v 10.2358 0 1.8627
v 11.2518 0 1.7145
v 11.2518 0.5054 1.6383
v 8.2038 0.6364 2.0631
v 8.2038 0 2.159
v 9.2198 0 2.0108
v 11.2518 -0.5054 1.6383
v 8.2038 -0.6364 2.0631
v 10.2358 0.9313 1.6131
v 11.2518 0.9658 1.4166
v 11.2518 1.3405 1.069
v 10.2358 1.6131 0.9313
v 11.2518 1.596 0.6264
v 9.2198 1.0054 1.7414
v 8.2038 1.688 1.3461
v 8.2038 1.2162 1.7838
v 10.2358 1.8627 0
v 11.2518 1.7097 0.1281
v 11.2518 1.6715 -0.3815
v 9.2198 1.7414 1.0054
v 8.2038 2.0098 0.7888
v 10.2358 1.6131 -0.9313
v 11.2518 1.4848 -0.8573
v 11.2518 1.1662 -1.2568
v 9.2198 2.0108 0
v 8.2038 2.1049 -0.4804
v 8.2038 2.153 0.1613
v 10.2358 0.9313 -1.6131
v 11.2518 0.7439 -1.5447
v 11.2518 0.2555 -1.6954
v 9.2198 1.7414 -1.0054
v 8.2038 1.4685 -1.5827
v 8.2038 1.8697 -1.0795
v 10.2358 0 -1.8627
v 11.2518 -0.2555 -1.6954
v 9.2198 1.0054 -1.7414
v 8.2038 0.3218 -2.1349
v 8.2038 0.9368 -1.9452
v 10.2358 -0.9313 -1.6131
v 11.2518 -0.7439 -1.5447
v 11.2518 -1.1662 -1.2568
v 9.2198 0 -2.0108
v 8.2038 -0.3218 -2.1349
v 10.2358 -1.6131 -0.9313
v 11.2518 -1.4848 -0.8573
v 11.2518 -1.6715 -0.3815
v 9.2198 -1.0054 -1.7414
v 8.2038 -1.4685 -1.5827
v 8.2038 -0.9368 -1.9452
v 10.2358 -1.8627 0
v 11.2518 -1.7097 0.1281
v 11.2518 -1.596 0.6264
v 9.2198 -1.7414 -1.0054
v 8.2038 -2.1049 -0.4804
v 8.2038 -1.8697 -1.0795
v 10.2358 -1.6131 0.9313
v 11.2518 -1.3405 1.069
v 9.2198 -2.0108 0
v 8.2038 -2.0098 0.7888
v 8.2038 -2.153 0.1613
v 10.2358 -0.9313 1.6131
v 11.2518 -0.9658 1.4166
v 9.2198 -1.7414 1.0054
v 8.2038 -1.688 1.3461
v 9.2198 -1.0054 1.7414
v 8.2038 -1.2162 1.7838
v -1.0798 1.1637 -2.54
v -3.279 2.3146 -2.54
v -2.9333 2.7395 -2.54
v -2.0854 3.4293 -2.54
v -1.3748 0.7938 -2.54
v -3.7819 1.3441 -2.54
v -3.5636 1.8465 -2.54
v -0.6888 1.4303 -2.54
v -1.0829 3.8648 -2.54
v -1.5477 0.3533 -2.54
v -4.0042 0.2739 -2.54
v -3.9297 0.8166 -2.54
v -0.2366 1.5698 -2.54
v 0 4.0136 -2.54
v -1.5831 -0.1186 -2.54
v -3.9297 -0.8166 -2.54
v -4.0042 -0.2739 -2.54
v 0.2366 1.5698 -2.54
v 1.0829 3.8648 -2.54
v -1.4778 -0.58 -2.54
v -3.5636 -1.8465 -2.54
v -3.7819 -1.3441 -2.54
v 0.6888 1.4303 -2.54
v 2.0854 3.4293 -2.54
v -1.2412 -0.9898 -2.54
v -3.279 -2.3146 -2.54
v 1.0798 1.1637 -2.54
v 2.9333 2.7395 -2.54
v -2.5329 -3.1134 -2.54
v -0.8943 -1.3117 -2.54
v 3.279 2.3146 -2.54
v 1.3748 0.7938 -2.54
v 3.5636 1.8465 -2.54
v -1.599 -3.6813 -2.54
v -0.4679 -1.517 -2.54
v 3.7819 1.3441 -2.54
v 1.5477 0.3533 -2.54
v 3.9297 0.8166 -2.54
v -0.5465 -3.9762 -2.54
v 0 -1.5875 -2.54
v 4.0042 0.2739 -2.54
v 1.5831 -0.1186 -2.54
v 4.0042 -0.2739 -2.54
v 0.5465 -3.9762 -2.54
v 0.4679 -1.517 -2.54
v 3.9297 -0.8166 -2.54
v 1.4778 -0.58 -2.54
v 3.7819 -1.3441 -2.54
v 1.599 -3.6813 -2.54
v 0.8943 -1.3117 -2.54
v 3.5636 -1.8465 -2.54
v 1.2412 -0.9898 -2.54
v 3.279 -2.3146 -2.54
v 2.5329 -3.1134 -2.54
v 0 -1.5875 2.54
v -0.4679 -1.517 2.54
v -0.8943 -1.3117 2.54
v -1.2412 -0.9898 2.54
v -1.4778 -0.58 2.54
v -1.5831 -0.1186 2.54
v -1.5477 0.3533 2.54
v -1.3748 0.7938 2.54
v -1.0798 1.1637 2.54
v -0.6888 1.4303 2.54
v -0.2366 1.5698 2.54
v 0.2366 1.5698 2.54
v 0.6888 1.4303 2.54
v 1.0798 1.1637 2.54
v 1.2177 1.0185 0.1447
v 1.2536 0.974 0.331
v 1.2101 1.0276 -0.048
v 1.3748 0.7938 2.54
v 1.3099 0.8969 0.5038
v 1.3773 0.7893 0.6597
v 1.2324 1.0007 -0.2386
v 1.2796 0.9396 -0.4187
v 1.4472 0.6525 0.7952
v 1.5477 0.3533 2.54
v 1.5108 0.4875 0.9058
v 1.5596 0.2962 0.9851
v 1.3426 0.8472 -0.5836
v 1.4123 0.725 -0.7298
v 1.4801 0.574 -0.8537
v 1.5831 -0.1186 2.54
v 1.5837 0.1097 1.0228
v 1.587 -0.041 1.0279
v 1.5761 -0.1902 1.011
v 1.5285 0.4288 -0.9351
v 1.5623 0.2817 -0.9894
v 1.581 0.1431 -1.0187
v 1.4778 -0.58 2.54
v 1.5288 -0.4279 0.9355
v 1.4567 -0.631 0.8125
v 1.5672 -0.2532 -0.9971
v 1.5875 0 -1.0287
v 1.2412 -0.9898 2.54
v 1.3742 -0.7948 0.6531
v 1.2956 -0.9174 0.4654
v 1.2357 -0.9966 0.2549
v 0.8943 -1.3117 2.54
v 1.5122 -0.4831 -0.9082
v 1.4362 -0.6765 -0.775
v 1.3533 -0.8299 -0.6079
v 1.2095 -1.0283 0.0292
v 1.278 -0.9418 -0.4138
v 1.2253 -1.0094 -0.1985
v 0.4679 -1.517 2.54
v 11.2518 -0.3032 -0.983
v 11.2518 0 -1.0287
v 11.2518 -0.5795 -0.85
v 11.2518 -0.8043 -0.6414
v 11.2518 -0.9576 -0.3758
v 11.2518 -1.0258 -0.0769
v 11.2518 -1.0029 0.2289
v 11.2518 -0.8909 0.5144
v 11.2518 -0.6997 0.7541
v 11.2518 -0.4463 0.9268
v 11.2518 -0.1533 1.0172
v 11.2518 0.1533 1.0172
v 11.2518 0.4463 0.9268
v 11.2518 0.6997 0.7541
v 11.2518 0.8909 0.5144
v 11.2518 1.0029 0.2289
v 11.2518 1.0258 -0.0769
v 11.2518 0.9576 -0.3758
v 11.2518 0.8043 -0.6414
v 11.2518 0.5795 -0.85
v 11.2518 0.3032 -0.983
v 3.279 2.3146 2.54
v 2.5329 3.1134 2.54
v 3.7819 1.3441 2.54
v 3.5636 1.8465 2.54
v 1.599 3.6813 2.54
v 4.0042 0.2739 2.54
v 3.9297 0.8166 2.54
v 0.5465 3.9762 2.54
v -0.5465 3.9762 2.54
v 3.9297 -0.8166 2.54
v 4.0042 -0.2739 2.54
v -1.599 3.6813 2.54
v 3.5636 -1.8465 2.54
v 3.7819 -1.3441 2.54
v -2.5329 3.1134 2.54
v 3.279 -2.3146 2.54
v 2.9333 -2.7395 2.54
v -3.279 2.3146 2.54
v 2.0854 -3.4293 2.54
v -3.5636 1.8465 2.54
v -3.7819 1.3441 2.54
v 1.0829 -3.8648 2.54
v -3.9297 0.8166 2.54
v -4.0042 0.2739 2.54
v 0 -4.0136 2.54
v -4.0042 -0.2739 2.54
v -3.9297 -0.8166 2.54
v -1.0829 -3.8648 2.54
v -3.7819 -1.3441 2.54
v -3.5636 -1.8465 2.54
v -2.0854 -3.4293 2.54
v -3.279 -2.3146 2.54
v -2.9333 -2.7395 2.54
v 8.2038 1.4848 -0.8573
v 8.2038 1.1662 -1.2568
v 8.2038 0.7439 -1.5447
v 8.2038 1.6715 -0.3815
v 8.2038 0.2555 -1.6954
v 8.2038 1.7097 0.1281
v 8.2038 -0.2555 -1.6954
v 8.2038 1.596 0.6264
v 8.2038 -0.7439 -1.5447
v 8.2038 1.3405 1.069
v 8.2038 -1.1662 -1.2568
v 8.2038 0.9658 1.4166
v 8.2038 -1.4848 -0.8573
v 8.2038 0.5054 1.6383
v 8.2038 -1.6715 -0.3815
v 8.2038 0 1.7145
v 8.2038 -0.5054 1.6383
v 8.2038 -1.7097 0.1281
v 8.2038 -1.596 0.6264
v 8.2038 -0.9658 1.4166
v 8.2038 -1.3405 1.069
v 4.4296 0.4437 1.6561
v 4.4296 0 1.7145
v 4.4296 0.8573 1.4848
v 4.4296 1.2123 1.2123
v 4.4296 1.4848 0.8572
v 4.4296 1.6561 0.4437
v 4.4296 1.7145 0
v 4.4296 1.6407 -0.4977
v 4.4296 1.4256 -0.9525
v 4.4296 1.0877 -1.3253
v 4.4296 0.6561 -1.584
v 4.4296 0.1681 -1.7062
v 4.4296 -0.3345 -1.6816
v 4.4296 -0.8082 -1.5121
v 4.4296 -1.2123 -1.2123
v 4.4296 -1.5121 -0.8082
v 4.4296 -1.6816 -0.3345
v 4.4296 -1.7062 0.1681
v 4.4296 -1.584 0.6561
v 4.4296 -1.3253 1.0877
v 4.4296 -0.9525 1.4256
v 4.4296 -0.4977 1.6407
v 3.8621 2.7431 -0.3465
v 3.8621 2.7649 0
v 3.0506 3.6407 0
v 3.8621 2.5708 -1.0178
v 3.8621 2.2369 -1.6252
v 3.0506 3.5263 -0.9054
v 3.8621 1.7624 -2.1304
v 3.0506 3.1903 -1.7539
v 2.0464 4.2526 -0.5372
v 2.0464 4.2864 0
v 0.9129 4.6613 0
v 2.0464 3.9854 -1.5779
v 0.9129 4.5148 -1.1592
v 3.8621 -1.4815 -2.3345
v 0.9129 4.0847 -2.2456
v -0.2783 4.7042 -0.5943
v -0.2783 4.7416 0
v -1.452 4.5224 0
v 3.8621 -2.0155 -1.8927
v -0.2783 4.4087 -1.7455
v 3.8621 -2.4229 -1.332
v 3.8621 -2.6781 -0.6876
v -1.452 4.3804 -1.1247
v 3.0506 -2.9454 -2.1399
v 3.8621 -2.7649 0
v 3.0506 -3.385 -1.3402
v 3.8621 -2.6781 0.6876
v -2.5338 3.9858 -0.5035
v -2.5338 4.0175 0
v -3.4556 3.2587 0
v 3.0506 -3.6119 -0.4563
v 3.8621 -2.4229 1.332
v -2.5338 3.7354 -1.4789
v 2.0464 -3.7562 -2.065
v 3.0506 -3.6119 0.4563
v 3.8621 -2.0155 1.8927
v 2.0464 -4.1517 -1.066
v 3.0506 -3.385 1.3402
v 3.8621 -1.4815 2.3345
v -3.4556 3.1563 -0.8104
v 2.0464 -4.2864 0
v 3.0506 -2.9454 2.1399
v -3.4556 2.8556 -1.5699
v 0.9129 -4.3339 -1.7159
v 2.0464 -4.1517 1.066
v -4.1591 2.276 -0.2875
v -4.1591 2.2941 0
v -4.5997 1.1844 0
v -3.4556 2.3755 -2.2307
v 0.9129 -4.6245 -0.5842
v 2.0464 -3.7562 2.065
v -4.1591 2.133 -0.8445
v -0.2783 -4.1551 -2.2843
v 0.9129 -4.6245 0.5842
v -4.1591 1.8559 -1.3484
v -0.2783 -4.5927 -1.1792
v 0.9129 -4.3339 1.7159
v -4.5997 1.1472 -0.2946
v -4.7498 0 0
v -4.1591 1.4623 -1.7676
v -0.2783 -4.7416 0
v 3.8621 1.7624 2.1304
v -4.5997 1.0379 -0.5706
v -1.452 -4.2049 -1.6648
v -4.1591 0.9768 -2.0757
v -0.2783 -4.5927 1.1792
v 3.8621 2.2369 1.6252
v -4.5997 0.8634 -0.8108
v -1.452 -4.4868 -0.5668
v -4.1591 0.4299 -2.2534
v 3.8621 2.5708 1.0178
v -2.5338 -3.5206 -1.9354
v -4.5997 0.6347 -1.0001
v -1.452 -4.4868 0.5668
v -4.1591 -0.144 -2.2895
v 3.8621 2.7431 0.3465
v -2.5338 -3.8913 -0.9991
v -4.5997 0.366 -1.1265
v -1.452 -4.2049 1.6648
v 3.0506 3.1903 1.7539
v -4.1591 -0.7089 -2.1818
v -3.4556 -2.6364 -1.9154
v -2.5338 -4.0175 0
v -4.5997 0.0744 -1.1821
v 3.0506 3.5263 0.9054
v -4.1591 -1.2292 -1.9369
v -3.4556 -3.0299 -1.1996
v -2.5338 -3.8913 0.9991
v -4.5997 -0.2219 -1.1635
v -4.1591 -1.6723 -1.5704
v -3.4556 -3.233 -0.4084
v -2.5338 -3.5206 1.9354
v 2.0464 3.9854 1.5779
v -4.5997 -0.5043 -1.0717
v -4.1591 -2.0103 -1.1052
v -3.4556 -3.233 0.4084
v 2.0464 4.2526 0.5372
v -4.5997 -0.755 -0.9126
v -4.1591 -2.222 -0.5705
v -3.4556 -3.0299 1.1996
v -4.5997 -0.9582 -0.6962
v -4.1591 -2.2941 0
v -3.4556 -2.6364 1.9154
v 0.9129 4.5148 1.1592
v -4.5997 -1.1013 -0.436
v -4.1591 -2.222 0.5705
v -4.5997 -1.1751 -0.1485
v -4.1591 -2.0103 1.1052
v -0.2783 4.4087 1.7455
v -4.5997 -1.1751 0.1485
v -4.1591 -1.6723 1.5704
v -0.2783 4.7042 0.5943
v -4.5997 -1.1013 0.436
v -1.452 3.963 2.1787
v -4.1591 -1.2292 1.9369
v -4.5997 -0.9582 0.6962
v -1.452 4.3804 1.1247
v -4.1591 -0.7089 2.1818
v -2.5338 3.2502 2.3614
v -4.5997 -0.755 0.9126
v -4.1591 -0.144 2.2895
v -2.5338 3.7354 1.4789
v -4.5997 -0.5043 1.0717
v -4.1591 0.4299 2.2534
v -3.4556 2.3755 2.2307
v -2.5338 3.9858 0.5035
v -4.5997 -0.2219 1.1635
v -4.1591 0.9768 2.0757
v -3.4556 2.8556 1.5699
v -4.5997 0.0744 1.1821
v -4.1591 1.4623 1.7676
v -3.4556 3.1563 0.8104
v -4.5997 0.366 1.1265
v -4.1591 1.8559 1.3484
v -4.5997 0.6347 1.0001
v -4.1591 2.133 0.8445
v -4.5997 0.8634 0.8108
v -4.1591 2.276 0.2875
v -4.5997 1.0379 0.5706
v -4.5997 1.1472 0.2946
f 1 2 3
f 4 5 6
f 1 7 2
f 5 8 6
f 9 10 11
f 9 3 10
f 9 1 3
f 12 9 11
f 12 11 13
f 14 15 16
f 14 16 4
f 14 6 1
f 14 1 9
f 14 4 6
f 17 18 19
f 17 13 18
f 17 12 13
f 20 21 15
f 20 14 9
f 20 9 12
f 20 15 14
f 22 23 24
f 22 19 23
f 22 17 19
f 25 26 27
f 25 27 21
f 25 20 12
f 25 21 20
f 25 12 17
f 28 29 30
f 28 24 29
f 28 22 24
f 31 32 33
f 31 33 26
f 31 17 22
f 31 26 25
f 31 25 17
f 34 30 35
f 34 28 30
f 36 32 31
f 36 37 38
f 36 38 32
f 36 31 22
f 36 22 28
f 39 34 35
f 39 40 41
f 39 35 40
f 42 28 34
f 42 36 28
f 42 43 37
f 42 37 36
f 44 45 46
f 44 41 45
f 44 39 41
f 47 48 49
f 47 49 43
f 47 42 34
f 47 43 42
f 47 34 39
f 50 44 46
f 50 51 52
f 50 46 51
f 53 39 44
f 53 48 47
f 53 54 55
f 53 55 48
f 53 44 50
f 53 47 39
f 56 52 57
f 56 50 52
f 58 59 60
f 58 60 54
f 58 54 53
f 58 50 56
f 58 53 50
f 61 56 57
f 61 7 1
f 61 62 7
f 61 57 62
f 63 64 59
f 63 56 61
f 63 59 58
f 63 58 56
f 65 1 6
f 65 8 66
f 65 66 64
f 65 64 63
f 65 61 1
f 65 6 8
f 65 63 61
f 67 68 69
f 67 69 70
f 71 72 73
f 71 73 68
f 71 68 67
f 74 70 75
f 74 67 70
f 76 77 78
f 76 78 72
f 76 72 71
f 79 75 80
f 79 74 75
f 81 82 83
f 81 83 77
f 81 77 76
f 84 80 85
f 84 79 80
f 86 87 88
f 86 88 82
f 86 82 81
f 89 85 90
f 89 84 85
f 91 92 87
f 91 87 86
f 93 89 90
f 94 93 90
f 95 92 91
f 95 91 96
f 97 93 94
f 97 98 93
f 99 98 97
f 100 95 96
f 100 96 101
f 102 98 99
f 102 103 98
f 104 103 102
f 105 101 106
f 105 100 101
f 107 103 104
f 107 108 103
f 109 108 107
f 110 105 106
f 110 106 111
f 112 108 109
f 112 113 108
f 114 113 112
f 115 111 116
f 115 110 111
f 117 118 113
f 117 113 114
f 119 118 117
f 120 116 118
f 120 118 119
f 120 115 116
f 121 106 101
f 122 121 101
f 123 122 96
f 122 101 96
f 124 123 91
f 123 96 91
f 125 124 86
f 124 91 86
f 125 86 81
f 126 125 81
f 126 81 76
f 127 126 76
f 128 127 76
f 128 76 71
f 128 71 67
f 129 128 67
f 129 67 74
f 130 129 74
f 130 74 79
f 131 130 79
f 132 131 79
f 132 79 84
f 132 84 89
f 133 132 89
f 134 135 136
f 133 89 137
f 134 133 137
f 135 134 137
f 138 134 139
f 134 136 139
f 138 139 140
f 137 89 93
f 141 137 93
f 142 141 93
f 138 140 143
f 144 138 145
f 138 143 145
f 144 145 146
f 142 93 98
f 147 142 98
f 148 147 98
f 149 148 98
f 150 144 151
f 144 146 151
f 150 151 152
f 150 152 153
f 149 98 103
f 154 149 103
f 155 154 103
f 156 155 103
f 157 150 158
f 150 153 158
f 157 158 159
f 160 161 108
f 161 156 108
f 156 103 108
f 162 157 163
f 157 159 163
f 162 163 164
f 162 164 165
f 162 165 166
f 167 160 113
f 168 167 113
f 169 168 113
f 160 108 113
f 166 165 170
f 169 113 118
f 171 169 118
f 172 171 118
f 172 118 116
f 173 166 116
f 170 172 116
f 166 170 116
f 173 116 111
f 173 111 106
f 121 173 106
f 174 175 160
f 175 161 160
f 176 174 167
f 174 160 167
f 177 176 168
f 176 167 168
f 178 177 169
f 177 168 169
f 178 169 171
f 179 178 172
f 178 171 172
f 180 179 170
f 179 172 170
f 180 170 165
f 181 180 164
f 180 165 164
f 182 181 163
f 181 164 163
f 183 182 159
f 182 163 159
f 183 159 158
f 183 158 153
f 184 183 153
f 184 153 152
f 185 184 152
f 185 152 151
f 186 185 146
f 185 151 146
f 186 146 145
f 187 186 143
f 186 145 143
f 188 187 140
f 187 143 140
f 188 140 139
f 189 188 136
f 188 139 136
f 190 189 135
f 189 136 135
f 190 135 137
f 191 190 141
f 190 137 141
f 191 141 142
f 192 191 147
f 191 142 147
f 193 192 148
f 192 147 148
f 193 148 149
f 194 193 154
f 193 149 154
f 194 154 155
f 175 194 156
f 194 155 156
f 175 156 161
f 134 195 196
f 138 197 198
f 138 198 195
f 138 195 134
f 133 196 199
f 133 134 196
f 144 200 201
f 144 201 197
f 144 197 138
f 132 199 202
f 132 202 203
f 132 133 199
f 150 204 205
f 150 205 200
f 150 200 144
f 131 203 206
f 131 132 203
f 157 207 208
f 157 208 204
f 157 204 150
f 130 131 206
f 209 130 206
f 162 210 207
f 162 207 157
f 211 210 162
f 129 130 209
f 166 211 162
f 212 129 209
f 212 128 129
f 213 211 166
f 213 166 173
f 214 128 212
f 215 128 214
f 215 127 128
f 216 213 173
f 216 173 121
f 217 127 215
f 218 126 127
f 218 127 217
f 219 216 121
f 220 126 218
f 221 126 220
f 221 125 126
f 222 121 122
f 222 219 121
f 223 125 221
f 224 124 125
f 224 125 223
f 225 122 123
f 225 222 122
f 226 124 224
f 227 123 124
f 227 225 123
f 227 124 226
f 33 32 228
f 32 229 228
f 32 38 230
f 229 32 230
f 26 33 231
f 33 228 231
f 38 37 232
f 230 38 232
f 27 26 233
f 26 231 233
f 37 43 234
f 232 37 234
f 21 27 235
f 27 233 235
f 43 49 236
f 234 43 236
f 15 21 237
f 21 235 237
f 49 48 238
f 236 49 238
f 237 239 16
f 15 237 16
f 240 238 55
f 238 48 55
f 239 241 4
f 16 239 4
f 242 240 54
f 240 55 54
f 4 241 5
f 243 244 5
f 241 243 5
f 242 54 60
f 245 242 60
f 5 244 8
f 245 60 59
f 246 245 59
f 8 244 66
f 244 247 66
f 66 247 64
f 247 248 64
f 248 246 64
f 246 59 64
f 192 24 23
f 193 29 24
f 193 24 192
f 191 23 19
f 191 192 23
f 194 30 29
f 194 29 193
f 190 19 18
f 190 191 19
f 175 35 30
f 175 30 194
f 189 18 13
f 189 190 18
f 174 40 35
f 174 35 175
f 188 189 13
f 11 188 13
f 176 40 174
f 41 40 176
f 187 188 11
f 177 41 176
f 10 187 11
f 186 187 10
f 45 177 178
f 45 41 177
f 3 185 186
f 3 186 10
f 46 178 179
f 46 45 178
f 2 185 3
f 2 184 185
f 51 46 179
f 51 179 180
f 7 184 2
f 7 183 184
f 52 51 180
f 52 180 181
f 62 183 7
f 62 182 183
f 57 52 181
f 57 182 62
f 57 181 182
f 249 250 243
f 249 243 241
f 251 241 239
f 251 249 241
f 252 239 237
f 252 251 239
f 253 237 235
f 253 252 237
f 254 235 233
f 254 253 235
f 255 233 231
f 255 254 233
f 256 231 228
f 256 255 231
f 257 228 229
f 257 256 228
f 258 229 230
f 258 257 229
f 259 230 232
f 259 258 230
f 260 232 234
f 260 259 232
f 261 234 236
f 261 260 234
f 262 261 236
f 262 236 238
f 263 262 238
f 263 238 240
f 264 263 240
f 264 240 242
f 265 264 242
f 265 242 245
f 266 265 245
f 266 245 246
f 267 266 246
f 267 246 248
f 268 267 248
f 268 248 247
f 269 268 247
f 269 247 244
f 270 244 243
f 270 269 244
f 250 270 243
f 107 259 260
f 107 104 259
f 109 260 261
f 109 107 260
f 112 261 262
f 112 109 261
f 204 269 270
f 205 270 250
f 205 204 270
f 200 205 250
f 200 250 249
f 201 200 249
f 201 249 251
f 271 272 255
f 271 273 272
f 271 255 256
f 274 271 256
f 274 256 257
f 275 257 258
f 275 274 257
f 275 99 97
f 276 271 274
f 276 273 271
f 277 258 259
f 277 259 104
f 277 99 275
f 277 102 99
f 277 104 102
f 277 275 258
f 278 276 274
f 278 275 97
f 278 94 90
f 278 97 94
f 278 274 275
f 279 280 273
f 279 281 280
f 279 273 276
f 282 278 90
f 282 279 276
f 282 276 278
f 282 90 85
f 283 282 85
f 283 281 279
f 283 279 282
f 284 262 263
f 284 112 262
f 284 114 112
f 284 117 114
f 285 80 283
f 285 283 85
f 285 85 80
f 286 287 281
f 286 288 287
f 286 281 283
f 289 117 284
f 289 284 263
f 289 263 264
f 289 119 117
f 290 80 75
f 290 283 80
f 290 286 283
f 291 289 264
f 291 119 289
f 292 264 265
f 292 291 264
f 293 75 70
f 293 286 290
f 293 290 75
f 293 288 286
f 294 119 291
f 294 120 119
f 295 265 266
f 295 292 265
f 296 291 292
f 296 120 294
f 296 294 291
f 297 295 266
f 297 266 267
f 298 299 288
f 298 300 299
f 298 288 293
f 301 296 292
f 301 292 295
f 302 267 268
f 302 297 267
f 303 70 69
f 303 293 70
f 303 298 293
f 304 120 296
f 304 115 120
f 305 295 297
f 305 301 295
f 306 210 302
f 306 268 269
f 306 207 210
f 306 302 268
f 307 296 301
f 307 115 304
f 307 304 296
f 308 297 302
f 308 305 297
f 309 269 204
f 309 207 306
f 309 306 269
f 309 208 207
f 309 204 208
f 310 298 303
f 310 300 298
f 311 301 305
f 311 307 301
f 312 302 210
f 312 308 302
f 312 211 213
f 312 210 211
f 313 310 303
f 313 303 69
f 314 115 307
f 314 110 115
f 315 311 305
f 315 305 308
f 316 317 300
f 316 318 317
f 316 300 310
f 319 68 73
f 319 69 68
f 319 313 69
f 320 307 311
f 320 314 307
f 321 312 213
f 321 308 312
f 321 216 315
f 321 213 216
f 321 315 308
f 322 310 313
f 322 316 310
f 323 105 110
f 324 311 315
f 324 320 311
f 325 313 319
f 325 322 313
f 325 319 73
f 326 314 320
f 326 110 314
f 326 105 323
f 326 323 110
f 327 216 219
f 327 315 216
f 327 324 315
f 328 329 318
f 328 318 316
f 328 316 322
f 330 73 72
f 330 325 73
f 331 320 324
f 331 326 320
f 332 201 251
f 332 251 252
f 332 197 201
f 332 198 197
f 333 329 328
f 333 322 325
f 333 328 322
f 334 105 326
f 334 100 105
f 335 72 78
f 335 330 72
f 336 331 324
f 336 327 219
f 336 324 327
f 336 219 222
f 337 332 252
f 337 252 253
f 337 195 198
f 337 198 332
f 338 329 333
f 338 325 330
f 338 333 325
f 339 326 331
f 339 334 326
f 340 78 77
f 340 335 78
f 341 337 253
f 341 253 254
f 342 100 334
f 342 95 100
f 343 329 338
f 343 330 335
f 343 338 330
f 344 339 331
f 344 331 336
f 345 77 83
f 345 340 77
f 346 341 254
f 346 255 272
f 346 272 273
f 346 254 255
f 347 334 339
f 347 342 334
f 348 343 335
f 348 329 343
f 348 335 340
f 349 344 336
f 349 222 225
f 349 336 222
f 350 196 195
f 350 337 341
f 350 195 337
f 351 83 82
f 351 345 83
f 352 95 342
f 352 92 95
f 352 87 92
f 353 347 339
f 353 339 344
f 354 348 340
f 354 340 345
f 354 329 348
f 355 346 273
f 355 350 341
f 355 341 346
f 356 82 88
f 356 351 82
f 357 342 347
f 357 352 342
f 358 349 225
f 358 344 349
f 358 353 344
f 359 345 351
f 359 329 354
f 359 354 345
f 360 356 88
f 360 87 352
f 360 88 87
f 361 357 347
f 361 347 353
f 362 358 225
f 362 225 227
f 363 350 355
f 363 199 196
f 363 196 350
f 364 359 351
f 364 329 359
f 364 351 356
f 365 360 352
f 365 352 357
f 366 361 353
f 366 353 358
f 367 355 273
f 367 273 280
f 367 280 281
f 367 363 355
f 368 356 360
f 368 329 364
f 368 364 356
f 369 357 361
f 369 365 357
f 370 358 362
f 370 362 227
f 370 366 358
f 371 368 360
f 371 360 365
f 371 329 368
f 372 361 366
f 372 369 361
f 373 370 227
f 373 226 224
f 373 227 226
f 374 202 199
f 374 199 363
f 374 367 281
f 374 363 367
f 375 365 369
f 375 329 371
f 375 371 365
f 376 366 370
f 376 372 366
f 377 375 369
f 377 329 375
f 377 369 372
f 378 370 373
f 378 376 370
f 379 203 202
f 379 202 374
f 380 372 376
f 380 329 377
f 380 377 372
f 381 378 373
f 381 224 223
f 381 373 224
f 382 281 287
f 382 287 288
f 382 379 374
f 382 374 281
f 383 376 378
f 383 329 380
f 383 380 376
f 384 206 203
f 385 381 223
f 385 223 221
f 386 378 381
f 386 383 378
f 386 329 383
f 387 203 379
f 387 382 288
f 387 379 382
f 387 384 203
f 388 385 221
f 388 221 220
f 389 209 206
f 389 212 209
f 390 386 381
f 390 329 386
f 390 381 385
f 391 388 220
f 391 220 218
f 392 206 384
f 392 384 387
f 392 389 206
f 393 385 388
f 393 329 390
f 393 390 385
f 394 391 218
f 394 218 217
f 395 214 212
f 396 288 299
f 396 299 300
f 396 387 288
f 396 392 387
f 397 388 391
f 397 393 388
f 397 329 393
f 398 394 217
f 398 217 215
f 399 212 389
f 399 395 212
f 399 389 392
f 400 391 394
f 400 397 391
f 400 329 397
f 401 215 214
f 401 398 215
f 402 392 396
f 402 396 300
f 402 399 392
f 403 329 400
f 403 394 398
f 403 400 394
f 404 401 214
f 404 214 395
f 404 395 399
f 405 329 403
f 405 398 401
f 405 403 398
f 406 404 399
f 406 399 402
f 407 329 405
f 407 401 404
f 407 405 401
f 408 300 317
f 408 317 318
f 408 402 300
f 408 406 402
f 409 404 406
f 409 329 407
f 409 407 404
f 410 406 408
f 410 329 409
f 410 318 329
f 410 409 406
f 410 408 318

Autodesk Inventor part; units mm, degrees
ref_plane "YZ Plane" through (0, 0, 0) normal (1, 0, 0) x (0, 1, 0)
ref_plane "XZ Plane" through (0, 0, 0) normal (0, 1, 0) x (-1, 0, 0)
ref_plane "XY Plane" through (0, 0, 0) normal (0, 0, 1) x (1, 0, 0)
sketch "Sketch2" plane through (0, 0, 0) normal (0, 0, 1) x (1, 0, 0)
  circle A0 centre (0, 0) radius 4.7498
  line L0 (4.7498, 0) -> (-4.7498, 0)
  dimension "d1" = 4.7498
revolve "Revolution1" add sketch "Sketch2" angle 360 about axis through (4.7498, 0, 0) along (-1, 0, 0) picked at (-0.543, 3.0005) contours L0 A0
sketch "Sketch3" plane through (0, 0, 0) normal (0, 1, 0) x (-1, 0, 0)
  arc A0 (0, 4.7498) -> (0, -4.7498) centre (0, 0) ccw projected
  arc A1 (0, -4.7498) -> (0, 4.7498) centre (0, 0) ccw projected
  line L0 (-4.7498, 2.54) -> (4.7498, 2.54)
  line L1 (4.7498, 2.54) -> (4.7498, -2.54)
  line L2 (4.7498, -2.54) -> (-4.7498, -2.54)
  line L3 (-4.7498, -2.54) -> (-4.7498, 2.54)
  line L4 (0, 0) -> (0, 2.54)
  line L5 (-4.7498, 2.54) -> (4.7498, 2.54)
  line L6 (4.7498, 2.54) -> (4.7498, 4.7498)
  line L7 (4.7498, 4.7498) -> (-4.7498, 4.7498)
  line L8 (-4.7498, 4.7498) -> (-4.7498, 2.54)
  line L9 (-4.7498, -2.54) -> (4.7498, -2.54)
  line L10 (4.7498, -2.54) -> (4.7498, -4.7498)
  line L11 (4.7498, -4.7498) -> (-4.7498, -4.7498)
  line L12 (-4.7498, -4.7498) -> (-4.7498, -2.54)
  dimension "d3" = 5.08
  dimension "d5" = 2.54
extrude "Extrusion1" cut sketch "Sketch3" along normal mid plane 25.4 contours A1 L0 A0 | L7 L6 L0 A1 | A0 L0 L8 L7 | L2 A1 A0 | A0 L11 L12 L2 | L2 L10 L11 A1
sketch "Sketch5" plane through (0, 0, 0) normal (0, 1, 0) x (-1, 0, 0)
  line L0 (4.0136, -2.54) -> (-4.0136, -2.54) projected
  arc A0 (-4.0136, 2.54) -> (-4.0136, -2.54) centre (0, 0) ccw projected
  line L1 (-4.0136, 2.54) -> (4.0136, 2.54) projected
  arc A1 (4.0136, -2.54) -> (4.0136, 2.54) centre (0, 0) ccw projected
  line L2 (0, 0) -> (-18.5035, 0)
  line L3 (-11.2518, 0) -> (-11.2518, 1.7145)
  line L4 (-11.2518, 1.7145) -> (-8.2038, 2.159)
  line L5 (-8.2038, 2.159) -> (-8.2038, 1.7145)
  line L6 (-8.2038, 1.7145) -> (-4.4296, 1.7145)
  line L7 (-4.4296, 1.7145) -> (-4.4296, 0)
  line L8 (-11.2518, 0) -> (-4.4296, 0)
  dimension "d12" = 4.0136
  dimension "d15" = 3.429
  dimension "d16" = 4.318
  dimension "d17" = 15.2654
  dimension "d18" = 12.2174
revolve "Revolution2" add sketch "Sketch5" angle 360 about axis through (0, 0, 0) along (1, 0, 0) contours L2 L3 L4 L5 L6 A0 | A0 L7 L2
sketch "Sketch6" plane through (0, 0, 2.54) normal (0, 0, 1) x (1, 0, 0)
  circle A0 centre (0, 0) radius 4.0136 projected
hole "Hole1" at (0, 0, 2.54) direction (0, 0, -1) diameter 3.175 end through all
sketch "Sketch7" plane through (11.2518, 0, 0) normal (1, 0, 0) x (0, 0, -1)
  circle A0 centre (0, 0) radius 1.7145 projected
hole "Hole2" at (11.2518, 0, 0) direction (-1, 0, 0) diameter 2.0574 end up to surface clearance for "Flat Head Machine Screw (82)" size "#1" standard "Ansi Unified Screw Threads"
equation "\"d5\" = 0.5 * d3"
properties part number "Fuel Intake" material "Nylon, molybdenum disulphide"
